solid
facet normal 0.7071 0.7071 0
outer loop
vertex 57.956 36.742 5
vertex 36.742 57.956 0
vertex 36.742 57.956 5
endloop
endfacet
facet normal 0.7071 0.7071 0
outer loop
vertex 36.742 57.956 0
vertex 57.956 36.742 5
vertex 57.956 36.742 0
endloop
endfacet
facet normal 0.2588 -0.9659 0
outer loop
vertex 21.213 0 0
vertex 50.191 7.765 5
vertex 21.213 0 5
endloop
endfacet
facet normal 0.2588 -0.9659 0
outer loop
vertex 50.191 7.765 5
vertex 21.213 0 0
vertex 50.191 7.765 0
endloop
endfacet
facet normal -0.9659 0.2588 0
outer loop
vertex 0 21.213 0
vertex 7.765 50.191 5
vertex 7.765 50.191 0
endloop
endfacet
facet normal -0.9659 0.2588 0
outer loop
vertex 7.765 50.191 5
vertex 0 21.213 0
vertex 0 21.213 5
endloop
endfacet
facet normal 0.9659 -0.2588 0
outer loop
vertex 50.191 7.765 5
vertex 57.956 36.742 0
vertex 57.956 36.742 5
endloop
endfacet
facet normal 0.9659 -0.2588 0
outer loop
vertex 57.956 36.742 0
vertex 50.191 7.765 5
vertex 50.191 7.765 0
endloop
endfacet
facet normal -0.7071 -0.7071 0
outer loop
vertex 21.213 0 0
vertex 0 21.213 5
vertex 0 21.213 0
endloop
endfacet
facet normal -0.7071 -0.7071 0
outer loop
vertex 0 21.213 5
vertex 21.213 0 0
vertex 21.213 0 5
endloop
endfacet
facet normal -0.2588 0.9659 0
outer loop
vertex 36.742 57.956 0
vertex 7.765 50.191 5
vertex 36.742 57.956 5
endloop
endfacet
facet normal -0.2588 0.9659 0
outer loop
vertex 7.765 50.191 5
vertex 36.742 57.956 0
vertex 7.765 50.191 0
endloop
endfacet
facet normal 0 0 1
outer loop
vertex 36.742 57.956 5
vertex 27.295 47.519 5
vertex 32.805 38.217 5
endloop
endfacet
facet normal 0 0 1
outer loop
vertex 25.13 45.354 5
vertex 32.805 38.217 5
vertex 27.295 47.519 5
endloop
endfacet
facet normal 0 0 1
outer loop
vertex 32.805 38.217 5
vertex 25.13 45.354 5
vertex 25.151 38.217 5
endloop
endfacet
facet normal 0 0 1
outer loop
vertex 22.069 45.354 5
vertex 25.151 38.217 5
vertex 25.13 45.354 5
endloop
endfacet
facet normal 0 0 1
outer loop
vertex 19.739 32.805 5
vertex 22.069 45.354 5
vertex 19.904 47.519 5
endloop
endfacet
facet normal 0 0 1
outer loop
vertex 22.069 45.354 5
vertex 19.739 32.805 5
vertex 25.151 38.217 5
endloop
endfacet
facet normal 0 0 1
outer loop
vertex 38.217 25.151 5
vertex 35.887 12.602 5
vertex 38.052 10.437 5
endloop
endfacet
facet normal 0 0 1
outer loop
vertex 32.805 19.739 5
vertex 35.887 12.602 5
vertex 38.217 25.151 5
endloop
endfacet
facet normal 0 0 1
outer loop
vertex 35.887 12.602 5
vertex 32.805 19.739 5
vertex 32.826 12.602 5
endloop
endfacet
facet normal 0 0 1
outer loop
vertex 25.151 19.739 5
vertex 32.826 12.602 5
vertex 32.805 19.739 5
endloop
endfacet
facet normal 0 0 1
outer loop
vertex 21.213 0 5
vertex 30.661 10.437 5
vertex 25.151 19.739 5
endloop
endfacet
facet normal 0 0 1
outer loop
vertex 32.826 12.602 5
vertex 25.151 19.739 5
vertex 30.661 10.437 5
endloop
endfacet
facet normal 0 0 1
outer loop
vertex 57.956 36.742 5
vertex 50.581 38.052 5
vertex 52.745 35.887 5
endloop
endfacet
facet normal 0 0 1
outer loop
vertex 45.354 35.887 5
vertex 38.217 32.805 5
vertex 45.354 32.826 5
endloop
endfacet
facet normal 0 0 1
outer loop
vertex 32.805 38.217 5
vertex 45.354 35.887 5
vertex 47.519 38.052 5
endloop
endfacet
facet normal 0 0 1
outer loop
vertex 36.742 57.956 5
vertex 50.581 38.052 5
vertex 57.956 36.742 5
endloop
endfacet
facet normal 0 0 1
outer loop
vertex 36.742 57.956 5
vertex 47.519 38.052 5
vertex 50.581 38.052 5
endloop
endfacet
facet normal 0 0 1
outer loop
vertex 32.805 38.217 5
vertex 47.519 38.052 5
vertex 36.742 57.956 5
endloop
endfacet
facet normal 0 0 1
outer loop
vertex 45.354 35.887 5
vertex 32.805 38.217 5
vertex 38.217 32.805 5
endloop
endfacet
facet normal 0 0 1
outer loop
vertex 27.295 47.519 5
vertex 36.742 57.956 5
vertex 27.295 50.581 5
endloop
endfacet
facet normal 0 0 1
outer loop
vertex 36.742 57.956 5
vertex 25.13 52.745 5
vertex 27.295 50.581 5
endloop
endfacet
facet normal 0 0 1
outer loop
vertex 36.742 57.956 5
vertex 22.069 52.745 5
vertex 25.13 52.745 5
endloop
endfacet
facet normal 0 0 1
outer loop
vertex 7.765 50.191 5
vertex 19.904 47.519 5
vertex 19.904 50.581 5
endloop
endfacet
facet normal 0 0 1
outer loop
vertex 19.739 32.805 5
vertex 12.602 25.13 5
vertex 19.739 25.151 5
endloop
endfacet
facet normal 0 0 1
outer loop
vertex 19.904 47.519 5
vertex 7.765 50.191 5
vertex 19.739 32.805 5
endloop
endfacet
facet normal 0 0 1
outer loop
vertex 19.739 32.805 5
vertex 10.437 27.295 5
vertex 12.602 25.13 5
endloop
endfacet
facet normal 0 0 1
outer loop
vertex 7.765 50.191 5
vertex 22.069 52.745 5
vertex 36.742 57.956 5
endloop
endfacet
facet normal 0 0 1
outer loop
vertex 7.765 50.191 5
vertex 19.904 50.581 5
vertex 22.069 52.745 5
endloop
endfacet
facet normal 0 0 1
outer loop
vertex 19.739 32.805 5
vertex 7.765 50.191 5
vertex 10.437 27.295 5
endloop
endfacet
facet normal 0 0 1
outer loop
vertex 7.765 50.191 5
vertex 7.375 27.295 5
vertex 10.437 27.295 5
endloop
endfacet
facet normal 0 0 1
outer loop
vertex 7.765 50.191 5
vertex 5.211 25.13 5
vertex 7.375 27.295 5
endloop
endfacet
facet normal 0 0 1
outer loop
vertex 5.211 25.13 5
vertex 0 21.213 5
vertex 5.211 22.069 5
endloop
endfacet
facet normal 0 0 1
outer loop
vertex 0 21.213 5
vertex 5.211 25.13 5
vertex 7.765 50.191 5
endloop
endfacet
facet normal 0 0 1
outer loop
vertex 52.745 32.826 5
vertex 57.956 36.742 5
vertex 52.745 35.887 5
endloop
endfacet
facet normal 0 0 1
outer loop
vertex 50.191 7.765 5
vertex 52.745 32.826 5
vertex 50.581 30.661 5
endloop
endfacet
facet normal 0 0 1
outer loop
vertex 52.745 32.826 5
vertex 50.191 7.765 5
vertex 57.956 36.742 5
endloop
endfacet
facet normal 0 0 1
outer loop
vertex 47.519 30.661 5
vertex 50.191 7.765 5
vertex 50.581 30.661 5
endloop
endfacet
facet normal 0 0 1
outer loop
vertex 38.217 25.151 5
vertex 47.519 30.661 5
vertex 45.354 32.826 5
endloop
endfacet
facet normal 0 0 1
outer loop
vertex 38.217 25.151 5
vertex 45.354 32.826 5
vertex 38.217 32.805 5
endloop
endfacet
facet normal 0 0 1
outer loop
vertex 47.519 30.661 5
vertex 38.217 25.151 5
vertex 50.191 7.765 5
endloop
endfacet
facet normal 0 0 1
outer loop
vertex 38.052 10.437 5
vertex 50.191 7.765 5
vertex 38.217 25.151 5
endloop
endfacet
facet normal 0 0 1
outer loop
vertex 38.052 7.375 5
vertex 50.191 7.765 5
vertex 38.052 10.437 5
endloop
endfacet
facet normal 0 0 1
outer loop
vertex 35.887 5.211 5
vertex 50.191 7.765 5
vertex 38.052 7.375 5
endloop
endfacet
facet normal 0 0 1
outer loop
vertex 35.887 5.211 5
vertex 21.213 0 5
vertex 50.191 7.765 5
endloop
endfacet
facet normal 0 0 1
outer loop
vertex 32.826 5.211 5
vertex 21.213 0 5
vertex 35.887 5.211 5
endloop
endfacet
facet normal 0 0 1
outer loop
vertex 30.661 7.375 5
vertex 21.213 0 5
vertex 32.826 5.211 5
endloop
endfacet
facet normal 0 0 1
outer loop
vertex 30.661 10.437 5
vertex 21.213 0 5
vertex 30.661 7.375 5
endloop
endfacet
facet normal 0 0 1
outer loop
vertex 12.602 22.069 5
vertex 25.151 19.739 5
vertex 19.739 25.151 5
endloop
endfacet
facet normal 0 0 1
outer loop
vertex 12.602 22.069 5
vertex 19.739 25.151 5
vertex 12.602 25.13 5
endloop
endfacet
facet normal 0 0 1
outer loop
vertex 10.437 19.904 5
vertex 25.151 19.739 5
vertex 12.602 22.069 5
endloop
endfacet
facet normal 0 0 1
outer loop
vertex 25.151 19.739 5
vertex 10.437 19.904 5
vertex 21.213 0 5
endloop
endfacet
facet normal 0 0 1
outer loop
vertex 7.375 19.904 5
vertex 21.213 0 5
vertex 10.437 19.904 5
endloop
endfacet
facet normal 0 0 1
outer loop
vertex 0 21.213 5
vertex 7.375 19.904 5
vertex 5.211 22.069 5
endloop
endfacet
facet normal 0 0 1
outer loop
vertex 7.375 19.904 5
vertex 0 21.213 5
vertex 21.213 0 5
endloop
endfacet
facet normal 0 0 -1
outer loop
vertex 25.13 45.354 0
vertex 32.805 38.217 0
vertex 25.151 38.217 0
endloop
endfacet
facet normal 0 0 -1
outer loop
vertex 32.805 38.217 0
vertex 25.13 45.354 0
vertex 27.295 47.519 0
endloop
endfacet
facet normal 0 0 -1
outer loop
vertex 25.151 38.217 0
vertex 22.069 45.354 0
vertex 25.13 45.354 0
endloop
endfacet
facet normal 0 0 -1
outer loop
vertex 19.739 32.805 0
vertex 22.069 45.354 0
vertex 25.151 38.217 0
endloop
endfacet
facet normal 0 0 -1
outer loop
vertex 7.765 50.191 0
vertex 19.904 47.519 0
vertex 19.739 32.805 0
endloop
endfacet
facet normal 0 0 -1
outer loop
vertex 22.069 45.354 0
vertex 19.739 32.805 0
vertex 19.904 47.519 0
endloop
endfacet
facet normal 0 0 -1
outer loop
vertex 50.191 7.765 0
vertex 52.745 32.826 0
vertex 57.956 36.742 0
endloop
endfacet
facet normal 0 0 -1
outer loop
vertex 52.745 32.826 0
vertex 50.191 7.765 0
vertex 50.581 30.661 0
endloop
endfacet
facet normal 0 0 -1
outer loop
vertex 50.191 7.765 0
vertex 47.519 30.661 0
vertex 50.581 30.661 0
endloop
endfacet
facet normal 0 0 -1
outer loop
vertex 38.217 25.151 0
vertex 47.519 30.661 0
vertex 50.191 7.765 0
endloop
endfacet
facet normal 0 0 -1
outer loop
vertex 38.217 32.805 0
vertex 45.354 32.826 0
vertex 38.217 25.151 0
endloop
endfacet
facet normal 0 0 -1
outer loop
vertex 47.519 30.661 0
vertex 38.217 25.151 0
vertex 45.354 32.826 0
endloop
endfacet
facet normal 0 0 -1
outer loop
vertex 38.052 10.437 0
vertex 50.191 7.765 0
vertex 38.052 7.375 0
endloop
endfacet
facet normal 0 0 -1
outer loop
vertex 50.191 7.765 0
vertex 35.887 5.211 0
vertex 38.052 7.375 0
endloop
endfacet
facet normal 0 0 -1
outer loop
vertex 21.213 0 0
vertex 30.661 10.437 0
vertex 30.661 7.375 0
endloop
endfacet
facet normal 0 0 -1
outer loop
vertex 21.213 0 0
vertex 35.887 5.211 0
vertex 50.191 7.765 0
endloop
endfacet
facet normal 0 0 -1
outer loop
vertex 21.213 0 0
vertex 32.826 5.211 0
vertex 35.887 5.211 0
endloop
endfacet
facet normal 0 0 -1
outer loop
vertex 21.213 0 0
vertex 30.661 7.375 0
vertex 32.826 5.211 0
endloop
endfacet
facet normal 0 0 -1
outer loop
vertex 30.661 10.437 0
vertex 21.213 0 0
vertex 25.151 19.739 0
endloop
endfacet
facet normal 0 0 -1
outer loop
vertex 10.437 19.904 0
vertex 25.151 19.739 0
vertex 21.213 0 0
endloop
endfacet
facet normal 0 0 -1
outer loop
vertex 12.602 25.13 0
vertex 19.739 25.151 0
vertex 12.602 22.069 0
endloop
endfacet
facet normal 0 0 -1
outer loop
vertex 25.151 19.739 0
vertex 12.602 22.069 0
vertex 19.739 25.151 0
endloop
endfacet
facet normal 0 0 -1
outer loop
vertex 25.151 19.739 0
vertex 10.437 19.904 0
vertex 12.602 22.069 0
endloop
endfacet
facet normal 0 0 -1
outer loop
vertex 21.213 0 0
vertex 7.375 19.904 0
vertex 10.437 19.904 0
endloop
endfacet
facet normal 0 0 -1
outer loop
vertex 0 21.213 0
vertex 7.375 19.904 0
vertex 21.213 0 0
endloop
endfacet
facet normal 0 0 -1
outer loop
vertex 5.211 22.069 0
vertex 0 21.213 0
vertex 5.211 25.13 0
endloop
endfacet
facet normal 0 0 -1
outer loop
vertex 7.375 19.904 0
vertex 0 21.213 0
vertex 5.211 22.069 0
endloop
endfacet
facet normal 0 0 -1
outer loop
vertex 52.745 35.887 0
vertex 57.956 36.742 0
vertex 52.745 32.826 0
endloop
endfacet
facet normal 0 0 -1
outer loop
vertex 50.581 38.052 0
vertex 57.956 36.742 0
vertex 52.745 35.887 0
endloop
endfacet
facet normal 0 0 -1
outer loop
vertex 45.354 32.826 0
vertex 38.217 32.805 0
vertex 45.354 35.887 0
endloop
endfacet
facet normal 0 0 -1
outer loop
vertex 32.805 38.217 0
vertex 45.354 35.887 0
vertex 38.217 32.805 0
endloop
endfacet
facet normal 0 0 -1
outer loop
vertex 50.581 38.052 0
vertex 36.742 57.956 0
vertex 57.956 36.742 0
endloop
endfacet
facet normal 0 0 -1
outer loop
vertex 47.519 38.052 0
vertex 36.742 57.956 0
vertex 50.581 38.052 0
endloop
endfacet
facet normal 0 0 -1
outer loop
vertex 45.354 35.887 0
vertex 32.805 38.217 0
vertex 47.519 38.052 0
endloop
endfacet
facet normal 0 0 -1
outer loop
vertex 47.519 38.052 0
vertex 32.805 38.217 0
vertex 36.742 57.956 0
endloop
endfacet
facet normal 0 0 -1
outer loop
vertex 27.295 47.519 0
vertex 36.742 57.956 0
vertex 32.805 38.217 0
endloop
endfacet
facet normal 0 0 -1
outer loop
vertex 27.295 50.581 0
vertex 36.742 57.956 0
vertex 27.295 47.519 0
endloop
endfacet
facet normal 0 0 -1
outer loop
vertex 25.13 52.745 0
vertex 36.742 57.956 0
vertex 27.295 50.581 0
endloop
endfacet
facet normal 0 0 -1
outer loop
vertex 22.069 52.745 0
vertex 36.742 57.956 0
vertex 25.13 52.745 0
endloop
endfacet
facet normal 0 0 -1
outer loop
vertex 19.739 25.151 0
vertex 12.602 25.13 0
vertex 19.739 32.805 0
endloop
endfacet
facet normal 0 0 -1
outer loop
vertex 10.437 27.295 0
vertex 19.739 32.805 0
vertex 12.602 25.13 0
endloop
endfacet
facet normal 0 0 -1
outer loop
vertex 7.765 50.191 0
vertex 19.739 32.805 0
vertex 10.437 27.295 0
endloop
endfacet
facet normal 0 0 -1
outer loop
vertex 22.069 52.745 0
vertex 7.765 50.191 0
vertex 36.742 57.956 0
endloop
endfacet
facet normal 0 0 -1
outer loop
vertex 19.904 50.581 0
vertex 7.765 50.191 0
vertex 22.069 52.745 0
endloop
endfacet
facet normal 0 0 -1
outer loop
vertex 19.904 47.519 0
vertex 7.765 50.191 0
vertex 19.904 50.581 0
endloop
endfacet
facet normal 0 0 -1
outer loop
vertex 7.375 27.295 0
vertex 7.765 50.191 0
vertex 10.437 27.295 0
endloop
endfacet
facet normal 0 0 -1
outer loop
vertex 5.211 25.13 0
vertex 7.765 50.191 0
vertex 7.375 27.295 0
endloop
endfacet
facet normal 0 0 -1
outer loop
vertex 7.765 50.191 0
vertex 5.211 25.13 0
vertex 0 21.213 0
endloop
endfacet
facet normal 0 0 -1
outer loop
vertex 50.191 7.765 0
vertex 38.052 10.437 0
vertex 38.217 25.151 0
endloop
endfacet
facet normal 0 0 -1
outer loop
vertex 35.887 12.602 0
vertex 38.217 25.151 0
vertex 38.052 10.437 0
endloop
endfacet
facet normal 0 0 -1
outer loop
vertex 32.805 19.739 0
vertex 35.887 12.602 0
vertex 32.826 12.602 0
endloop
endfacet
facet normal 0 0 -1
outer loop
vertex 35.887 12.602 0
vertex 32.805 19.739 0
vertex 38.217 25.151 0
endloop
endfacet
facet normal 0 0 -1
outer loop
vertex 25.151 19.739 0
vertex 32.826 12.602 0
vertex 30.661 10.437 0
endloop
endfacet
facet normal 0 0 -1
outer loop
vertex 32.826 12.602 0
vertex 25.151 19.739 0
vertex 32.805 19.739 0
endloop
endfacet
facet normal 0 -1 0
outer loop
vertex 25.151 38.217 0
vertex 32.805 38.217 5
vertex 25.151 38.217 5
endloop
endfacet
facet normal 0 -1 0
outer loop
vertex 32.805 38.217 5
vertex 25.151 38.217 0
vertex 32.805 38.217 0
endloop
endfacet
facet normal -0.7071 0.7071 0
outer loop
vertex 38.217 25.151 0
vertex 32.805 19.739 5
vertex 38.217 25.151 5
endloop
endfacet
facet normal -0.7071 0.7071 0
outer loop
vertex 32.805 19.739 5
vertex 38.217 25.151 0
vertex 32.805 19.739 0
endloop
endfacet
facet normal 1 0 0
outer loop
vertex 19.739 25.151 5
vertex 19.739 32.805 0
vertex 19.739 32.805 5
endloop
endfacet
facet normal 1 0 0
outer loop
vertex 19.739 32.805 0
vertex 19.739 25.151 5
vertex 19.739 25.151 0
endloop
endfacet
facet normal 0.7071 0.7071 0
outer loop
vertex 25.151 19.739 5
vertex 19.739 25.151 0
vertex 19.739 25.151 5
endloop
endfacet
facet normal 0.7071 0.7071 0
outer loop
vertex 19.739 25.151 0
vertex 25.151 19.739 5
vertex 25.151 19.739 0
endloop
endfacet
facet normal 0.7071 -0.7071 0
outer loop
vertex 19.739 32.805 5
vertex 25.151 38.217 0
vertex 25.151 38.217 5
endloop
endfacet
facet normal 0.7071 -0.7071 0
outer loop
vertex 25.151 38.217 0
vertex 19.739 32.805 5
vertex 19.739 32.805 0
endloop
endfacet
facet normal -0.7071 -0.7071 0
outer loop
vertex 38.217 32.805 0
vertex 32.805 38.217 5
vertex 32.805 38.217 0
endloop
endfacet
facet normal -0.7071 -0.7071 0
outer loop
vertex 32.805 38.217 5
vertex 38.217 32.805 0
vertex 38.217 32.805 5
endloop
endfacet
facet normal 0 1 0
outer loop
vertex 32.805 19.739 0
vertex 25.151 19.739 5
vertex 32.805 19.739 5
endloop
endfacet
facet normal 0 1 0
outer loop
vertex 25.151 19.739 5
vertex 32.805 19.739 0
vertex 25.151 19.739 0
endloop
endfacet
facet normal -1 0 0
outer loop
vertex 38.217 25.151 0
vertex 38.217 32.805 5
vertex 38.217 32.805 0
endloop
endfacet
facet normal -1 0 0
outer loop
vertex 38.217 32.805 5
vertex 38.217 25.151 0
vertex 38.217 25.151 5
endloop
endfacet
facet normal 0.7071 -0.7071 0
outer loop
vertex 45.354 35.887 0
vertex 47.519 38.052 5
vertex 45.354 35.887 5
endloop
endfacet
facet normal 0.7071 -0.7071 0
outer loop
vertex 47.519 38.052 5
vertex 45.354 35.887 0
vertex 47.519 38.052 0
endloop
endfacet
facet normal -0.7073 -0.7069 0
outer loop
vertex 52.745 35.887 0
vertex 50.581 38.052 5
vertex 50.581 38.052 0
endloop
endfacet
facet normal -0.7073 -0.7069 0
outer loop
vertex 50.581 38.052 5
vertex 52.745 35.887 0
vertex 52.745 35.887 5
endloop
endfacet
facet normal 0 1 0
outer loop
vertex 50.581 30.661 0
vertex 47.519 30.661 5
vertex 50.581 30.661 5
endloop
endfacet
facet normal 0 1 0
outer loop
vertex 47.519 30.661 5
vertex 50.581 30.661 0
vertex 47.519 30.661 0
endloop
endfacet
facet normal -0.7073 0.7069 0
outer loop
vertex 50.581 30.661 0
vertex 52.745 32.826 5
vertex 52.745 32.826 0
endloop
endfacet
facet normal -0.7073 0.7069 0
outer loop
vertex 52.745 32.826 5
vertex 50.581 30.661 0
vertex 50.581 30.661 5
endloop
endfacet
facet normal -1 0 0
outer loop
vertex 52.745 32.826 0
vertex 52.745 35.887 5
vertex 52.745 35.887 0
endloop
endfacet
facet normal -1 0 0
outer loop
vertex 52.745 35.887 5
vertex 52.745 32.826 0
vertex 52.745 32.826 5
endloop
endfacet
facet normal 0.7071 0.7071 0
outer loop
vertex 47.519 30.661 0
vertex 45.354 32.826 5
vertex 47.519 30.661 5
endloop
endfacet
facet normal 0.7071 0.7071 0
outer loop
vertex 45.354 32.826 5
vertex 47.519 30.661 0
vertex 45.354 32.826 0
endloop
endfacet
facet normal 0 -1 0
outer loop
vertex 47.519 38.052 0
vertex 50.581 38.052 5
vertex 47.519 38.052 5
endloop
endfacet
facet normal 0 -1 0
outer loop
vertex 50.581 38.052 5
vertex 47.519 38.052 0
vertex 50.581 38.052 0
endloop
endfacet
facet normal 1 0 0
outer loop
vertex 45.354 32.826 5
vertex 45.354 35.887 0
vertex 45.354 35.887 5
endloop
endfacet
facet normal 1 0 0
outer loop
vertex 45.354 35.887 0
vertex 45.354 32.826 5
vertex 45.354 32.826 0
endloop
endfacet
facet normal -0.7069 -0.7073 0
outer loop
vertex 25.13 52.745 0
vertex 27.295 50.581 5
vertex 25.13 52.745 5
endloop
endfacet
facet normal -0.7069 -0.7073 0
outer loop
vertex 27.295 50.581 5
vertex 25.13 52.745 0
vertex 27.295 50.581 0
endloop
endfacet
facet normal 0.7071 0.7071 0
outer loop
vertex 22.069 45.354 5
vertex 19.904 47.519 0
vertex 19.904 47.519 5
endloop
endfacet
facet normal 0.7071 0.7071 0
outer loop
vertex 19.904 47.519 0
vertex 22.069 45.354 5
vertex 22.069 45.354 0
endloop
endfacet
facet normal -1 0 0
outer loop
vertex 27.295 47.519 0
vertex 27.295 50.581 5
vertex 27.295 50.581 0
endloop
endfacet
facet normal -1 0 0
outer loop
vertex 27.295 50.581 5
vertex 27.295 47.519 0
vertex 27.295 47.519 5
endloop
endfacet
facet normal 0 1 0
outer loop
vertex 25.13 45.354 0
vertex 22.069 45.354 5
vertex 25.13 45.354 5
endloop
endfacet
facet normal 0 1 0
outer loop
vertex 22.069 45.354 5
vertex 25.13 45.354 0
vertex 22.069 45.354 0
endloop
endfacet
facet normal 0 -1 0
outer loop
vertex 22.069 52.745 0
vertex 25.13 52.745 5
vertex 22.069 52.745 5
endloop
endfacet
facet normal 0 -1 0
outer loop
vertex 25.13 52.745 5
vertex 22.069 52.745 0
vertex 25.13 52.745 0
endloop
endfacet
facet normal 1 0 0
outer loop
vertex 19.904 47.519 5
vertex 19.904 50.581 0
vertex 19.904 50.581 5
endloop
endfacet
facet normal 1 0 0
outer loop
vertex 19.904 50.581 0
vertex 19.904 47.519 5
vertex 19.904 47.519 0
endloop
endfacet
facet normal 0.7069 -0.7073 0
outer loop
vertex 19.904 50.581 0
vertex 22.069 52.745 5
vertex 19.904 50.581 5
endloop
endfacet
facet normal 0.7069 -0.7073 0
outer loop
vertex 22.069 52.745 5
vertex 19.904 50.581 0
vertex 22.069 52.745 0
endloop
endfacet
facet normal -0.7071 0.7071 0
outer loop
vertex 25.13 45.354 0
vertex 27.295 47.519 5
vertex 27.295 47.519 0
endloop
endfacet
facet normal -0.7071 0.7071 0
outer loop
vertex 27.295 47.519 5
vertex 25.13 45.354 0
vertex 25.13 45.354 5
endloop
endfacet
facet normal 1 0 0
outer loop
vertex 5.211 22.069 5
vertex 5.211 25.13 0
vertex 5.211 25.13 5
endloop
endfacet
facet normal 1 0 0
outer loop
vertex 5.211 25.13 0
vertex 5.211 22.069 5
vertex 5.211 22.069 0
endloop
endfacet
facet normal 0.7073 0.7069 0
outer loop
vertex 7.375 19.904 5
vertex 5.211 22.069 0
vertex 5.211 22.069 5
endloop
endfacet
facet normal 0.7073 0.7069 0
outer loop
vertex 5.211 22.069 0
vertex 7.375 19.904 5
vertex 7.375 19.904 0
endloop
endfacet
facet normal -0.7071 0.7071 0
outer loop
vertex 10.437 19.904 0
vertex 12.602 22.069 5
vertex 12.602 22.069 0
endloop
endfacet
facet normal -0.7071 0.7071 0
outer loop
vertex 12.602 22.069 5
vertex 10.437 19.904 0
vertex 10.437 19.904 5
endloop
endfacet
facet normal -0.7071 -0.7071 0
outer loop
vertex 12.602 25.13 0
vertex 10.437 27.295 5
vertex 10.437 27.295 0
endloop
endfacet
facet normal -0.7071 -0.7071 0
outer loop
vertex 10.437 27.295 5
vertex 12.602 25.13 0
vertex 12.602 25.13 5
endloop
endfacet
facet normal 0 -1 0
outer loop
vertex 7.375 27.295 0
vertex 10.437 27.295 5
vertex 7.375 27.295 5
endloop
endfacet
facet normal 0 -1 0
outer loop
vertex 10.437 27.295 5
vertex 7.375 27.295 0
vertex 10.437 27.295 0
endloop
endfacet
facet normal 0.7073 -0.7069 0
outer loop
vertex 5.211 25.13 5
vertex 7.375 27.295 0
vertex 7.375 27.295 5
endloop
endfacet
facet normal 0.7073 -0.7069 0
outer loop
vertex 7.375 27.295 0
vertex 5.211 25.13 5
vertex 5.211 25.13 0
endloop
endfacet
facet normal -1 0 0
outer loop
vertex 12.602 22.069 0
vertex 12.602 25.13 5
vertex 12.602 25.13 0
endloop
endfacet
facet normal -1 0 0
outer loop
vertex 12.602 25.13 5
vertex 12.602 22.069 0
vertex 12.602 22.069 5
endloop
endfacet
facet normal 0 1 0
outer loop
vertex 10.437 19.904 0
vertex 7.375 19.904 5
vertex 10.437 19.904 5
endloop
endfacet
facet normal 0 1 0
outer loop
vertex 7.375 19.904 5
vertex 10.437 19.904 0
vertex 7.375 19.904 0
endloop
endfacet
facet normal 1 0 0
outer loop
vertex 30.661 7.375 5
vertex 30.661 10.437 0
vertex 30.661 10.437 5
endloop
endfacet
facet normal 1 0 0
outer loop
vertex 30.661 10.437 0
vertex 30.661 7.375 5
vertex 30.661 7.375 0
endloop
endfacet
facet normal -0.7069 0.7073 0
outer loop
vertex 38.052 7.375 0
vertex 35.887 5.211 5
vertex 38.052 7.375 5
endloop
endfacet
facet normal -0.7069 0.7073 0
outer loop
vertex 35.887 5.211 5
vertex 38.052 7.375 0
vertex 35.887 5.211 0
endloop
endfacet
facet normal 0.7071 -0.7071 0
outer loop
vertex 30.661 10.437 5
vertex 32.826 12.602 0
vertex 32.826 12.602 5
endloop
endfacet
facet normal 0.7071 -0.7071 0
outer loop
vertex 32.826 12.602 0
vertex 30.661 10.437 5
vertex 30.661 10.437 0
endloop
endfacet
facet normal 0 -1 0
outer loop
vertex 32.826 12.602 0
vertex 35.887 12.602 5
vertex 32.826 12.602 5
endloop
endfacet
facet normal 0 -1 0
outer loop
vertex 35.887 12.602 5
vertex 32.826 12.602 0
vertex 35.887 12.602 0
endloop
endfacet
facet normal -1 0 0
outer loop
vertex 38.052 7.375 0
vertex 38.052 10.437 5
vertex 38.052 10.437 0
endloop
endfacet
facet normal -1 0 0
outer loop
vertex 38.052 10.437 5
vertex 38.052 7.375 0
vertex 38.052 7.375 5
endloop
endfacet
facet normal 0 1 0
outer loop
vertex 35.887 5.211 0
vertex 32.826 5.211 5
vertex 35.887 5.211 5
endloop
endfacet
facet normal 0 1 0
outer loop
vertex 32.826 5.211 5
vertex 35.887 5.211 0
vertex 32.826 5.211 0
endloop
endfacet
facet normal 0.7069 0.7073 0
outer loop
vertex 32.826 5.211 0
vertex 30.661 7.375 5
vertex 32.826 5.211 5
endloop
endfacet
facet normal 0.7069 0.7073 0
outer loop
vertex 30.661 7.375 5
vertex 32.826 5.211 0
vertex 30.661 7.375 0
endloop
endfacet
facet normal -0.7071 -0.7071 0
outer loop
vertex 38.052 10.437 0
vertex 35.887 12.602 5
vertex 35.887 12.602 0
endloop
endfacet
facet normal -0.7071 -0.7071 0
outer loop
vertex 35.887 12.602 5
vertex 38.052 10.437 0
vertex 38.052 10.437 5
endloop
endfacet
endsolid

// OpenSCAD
$fn = 32;

// ----------------------------------------------------------------------
// Polygon plate: 6-gon R30, 4 bolt windows
// ----------------------------------------------------------------------

// --- parameters (mm) ---
sides = 6;                // number of polygon sides
plate_r = 30;             // circumscribed radius of the polygon
bore_r = 10;              // centre bore radius
bolts = 4;                // number of bolt windows
ring_r = 20.78;           // bolt-circle radius
bolt_r = 4;               // bolt window radius
plate_t = 5;              // plate thickness, Z (extrusion height)

plate_d = 2 * plate_r;  // circumscribed diameter
bore_d = 2 * bore_r;  // centre bore diameter
bolt_d = 2 * bolt_r;  // bolt window diameter
ring_d = 2 * ring_r;  // bolt-circle diameter

profile = [[57.956, 36.742], [36.742, 57.956], [7.765, 50.191], [0, 21.213], [21.213, 0], [50.191, 7.765]];  // primary outline, 6 points, counter clockwise
void_1 = [[38.217, 32.805], [32.805, 38.217], [25.151, 38.217], [19.739, 32.805], [19.739, 25.151], [25.151, 19.739], [32.805, 19.739], [38.217, 25.151]];  // centre bore, 8 points
void_2 = [[52.745, 35.887], [50.581, 38.052], [47.519, 38.052], [45.354, 35.887], [45.354, 32.826], [47.519, 30.661], [50.581, 30.661], [52.745, 32.826]];  // bolt window 1, 8 points
void_3 = [[27.295, 50.581], [25.13, 52.745], [22.069, 52.745], [19.904, 50.581], [19.904, 47.519], [22.069, 45.354], [25.13, 45.354], [27.295, 47.519]];  // bolt window 2, 8 points
void_4 = [[12.602, 25.13], [10.437, 27.295], [7.375, 27.295], [5.211, 25.13], [5.211, 22.069], [7.375, 19.904], [10.437, 19.904], [12.602, 22.069]];  // bolt window 3, 8 points
void_5 = [[38.052, 10.437], [35.887, 12.602], [32.826, 12.602], [30.661, 10.437], [30.661, 7.375], [32.826, 5.211], [35.887, 5.211], [38.052, 7.375]];  // bolt window 4, 8 points

// --- the one profile operation ---
difference() {
  linear_extrude(height = plate_t) polygon(points = profile);
  translate([0, 0, -1])
    linear_extrude(height = plate_t + 2) polygon(points = void_1);
  translate([0, 0, -1])
    linear_extrude(height = plate_t + 2) polygon(points = void_2);
  translate([0, 0, -1])
    linear_extrude(height = plate_t + 2) polygon(points = void_3);
  translate([0, 0, -1])
    linear_extrude(height = plate_t + 2) polygon(points = void_4);
  translate([0, 0, -1])
    linear_extrude(height = plate_t + 2) polygon(points = void_5);
}
